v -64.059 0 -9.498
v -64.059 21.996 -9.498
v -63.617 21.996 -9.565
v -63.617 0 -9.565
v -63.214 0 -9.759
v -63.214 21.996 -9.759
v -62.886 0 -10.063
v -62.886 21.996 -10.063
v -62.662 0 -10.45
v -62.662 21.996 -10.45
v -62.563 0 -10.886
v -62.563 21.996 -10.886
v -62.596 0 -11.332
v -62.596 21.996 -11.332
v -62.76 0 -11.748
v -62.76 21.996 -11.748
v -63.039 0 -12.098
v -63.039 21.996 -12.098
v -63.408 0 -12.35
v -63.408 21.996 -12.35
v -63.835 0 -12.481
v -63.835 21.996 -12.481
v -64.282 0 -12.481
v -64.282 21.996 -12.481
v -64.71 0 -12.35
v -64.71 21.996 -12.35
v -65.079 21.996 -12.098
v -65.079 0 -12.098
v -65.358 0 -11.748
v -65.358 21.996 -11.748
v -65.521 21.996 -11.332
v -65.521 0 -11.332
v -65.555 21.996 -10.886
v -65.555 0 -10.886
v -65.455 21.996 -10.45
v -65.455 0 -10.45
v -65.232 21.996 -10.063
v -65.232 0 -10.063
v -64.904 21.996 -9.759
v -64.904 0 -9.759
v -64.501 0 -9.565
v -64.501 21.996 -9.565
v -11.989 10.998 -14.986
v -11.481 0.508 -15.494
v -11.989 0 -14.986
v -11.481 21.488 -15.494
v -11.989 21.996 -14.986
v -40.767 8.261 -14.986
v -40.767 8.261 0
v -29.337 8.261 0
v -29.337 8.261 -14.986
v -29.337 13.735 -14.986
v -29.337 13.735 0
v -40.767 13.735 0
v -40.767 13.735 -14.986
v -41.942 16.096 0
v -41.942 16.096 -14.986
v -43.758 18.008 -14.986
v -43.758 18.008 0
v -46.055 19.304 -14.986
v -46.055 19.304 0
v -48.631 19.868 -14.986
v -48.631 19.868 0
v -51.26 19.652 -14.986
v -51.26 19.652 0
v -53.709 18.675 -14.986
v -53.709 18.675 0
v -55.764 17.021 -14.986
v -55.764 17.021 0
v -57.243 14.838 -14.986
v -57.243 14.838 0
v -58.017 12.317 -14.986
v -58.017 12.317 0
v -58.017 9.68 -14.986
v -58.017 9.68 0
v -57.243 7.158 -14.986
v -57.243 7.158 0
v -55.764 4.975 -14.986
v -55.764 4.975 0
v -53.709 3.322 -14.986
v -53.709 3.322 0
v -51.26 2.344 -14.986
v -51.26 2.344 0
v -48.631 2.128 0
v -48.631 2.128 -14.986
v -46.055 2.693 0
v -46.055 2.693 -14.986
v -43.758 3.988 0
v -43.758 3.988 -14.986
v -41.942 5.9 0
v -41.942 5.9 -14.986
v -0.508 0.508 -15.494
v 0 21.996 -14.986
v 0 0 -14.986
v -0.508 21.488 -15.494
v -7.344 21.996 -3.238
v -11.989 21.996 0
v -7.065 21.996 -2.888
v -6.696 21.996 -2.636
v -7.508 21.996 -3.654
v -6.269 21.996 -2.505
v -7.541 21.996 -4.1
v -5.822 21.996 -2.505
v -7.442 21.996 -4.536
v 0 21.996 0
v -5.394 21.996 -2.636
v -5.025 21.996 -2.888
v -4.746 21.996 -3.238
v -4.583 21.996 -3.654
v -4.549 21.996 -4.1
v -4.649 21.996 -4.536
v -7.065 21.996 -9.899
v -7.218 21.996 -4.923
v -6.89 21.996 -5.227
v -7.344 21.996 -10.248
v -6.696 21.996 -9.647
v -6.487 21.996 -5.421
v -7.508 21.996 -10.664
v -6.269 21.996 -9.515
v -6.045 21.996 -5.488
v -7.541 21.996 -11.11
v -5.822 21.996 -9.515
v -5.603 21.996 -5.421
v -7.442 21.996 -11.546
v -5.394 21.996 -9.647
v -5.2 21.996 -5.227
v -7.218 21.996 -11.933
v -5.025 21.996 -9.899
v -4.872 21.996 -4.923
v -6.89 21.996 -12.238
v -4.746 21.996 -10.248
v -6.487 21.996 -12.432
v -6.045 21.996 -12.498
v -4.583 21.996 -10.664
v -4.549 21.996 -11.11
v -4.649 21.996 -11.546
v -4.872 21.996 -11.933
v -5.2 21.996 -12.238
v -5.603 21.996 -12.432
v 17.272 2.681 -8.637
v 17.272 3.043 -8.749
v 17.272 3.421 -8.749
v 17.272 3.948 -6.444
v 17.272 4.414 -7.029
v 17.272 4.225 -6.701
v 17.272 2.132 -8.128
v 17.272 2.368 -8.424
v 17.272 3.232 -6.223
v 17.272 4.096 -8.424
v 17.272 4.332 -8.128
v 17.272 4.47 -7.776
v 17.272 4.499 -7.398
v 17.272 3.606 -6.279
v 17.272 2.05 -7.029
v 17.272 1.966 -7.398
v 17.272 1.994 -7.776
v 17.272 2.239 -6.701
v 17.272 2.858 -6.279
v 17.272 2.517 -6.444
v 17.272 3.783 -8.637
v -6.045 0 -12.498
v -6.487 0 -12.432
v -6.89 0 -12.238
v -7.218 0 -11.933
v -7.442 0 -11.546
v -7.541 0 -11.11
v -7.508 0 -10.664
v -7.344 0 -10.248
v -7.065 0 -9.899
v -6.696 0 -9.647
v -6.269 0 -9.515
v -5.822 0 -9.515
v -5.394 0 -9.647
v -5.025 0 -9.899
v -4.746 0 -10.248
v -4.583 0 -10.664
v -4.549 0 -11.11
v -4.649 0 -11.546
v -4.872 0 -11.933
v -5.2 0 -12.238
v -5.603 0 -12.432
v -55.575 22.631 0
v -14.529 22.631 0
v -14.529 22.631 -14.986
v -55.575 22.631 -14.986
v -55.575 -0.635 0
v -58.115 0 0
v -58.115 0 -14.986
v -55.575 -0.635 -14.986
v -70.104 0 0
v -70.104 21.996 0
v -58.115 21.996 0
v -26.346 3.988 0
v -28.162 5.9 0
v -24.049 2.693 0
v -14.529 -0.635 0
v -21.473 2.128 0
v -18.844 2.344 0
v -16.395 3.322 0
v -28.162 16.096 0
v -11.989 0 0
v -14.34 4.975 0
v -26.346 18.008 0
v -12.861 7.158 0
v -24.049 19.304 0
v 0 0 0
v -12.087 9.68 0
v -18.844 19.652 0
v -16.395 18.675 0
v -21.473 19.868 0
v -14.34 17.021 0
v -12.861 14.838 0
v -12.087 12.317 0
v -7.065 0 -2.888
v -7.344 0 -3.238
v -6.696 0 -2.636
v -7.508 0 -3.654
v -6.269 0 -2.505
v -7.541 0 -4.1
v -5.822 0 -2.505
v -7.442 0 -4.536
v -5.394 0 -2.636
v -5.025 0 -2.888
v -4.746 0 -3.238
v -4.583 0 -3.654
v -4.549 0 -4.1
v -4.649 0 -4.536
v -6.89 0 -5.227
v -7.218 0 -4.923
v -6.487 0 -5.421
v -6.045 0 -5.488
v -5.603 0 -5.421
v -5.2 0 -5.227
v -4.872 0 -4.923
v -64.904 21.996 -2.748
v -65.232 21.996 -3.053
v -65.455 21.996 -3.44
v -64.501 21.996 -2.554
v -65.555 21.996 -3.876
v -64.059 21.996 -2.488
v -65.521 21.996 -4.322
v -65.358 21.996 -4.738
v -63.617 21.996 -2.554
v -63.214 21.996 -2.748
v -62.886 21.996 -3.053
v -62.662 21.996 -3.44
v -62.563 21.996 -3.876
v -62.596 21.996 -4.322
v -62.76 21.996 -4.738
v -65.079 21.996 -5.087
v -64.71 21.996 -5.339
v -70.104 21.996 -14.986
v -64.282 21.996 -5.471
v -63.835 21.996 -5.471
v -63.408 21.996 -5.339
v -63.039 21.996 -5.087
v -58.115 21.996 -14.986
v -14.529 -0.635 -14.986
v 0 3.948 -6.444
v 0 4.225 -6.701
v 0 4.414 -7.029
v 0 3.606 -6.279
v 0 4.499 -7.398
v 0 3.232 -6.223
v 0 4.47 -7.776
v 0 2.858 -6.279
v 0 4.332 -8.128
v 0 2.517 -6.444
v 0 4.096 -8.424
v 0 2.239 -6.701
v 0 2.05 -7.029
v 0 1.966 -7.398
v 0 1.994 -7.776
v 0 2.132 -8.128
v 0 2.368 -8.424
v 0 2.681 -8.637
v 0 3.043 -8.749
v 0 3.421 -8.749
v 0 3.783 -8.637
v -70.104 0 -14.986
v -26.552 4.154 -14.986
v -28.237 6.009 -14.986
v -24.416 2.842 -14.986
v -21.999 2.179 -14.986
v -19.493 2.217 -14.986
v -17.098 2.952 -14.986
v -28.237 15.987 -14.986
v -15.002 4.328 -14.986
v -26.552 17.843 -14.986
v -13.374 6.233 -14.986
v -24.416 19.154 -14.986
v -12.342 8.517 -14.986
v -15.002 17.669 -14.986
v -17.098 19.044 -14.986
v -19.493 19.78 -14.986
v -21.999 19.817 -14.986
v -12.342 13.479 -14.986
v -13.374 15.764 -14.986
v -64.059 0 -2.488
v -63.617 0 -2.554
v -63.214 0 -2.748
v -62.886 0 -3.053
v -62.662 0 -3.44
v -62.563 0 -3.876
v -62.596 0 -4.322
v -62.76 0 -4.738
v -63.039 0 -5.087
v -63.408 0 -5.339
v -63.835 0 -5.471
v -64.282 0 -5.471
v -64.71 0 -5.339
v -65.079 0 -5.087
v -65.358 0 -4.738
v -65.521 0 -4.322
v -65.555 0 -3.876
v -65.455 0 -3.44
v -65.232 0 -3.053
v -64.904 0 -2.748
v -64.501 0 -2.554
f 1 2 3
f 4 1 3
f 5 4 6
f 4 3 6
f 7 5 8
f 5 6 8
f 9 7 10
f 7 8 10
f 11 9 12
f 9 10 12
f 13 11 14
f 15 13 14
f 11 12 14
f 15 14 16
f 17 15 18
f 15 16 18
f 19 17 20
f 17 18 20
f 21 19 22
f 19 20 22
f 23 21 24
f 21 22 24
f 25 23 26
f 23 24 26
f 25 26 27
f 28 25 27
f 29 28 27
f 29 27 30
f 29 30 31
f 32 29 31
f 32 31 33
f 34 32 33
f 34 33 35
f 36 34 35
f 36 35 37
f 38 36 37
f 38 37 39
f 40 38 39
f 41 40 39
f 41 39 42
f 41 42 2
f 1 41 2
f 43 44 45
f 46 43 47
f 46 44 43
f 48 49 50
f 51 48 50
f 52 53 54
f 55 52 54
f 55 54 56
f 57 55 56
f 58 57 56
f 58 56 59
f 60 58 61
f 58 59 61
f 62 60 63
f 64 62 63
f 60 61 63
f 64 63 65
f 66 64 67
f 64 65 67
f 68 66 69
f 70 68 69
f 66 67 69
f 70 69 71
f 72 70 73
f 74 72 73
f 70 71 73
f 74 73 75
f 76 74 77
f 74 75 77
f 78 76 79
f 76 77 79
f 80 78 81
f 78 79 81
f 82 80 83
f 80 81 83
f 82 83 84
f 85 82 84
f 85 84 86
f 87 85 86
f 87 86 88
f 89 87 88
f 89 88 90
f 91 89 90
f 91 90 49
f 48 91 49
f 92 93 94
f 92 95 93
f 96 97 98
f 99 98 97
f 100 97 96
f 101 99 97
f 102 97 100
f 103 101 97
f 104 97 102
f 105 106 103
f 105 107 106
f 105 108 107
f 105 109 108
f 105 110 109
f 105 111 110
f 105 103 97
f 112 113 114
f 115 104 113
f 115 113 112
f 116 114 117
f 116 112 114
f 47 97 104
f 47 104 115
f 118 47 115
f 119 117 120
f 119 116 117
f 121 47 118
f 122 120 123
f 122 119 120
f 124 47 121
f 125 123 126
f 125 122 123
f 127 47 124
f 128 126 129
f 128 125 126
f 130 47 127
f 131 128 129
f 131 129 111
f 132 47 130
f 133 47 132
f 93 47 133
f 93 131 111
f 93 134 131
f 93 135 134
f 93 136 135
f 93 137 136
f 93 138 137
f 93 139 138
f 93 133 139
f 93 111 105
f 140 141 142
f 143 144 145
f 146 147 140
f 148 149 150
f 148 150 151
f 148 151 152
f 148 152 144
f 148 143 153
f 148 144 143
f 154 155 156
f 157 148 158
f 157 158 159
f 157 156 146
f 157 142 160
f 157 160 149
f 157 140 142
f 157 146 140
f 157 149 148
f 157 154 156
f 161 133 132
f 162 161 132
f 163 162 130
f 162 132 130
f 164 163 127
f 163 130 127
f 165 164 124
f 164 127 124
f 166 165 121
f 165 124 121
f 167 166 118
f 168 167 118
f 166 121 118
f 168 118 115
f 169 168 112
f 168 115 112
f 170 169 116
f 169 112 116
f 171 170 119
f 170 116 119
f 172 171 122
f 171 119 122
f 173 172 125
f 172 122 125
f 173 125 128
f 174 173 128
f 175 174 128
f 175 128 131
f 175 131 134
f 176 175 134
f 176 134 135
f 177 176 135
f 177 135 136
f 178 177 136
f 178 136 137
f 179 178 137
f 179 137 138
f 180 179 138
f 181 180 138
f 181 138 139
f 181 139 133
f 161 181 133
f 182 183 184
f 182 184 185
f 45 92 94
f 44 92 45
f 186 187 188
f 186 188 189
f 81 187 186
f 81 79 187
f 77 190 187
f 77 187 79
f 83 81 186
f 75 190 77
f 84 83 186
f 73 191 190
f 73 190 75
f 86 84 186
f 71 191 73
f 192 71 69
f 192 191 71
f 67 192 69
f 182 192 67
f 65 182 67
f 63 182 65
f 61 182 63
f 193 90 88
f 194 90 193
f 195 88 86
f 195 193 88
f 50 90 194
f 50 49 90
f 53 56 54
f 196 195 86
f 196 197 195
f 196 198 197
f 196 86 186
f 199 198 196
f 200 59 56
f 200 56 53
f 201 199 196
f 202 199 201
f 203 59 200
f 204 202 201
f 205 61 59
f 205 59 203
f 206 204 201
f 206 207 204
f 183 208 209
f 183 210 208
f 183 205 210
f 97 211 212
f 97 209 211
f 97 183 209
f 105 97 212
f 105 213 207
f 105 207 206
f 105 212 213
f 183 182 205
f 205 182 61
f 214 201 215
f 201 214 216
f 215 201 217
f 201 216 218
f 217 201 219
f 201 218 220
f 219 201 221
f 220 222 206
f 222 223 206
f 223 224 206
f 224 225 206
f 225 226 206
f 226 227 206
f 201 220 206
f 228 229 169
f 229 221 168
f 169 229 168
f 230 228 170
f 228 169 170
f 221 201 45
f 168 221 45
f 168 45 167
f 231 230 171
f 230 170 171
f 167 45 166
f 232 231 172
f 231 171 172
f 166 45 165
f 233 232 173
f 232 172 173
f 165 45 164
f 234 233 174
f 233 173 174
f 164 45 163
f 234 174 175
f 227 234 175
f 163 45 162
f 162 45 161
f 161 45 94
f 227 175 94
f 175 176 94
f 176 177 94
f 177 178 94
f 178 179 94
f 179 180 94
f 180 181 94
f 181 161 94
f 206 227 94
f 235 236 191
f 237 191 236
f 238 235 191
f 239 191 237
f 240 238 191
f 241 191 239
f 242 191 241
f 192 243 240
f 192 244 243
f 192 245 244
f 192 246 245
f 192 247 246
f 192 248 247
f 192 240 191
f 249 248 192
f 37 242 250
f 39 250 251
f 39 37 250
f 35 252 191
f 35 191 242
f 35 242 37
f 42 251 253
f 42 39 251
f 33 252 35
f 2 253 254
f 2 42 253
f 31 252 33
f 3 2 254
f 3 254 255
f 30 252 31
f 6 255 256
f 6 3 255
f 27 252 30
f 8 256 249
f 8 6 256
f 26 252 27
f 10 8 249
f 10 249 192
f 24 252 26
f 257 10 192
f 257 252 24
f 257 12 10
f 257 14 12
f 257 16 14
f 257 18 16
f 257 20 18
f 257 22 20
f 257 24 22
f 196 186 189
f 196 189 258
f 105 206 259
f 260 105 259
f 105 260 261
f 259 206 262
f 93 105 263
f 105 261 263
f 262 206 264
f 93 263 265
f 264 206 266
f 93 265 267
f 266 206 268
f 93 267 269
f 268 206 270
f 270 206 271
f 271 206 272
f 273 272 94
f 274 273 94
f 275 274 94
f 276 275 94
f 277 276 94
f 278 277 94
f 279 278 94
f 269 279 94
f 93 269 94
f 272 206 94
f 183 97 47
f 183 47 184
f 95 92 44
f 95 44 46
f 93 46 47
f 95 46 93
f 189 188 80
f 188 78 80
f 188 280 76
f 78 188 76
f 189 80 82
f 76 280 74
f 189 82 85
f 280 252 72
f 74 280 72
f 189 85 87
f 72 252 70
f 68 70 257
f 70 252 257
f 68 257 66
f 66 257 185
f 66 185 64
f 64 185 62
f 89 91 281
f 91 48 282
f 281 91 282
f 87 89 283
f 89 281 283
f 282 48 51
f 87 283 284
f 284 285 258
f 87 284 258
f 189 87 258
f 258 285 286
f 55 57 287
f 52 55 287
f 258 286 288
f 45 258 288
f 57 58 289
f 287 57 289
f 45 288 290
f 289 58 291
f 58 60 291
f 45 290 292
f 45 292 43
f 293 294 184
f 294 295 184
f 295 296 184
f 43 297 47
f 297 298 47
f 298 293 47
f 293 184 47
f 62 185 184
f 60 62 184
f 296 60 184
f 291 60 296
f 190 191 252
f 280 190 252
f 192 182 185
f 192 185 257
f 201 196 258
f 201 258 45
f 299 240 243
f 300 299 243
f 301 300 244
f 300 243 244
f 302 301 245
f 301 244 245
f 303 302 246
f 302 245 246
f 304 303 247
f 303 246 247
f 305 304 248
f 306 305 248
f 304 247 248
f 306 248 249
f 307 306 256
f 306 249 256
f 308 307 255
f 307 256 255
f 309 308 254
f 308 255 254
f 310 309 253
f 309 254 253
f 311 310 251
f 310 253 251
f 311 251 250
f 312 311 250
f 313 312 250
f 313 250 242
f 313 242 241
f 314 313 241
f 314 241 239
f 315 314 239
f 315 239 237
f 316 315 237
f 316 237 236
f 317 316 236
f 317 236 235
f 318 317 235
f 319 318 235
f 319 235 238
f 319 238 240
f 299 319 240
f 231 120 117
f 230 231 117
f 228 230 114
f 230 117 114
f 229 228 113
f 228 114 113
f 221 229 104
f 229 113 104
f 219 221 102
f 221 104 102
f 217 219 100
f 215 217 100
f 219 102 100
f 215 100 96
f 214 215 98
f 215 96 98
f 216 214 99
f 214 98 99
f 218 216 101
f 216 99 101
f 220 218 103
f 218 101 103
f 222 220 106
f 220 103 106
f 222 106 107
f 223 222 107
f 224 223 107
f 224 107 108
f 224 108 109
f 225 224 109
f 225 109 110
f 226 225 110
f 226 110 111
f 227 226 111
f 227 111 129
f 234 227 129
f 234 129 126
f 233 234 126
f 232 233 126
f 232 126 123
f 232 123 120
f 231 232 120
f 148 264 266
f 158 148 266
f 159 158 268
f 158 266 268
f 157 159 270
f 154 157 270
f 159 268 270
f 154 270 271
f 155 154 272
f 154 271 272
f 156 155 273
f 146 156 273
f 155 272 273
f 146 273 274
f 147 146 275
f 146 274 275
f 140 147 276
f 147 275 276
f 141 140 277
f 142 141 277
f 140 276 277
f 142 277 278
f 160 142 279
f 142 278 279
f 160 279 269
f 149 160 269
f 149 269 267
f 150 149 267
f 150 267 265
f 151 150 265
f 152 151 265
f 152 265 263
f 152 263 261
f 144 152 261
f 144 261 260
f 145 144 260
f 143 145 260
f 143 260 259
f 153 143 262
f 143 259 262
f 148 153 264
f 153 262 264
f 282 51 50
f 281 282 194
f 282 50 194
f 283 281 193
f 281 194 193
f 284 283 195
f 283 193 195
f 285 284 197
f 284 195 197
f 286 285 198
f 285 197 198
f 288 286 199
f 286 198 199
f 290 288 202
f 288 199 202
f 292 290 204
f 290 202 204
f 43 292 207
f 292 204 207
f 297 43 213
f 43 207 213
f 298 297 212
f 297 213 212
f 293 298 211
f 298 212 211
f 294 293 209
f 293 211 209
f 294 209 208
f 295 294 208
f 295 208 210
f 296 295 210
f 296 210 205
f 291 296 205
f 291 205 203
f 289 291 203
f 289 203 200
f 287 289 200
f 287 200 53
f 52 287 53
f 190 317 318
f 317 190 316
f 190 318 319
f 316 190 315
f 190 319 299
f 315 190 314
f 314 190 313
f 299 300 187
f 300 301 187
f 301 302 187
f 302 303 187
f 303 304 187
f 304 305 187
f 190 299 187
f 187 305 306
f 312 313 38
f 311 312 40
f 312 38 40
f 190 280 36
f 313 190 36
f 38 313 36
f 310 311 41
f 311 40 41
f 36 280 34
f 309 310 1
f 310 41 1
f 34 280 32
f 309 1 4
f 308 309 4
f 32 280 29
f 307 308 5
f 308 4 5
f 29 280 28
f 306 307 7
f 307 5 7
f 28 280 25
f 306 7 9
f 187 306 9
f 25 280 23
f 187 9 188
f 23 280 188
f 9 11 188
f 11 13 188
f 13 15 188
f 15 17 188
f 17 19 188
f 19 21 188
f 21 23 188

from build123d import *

# Parameters (mm, degrees)
SKETCH1_W           = 70.104
SKETCH1_H           = 14.986
BOSS_EXTRUDE1_DEPTH = 21.9964
CUT_EXTRUDE1_DEPTH  = 75.986616306
SKETCH4_R           = 1.5
CUT_EXTRUDE2_DEPTH  = 75.986616306
SKETCH5_R           = 1.27
BOSS_EXTRUDE2_DEPTH = 17.272
BOSS_EXTRUDE3_DEPTH = 14.986
SKETCH7_W           = 11.9888
SKETCH7_H           = 21.9964
BOSS_EXTRUDE4_DEPTH = 0.508
BOSS_EXTRUDE4_TAPER = 45


with BuildPart() as part:
    # Sketch1 → Boss-Extrude1 (new body)
    with BuildSketch(Plane(origin=(0, 0, 0), x_dir=(1, 0, 0), z_dir=(0, 1, 0))):
        with Locations((-35.052, 7.493)):
            Rectangle(SKETCH1_W, SKETCH1_H)
    extrude(amount=BOSS_EXTRUDE1_DEPTH)

    # Sketch3 → Cut-Extrude1 (cut, through all)
    with BuildSketch(Plane.XY):
        with BuildLine():
            Line((-29.337, 13.735160497), (-40.767, 13.735160497))
            ThreePointArc((-40.767, 13.735160497), (-58.1152, 10.9982), (-40.767, 8.261239503))
            Line((-40.767, 8.261239503), (-29.337, 8.261239503))
            ThreePointArc((-29.337, 8.261239503), (-11.9888, 10.9982), (-29.337, 13.735160497))
        make_face()
        Polygon((-58.1152, 21.9964), (-55.5752, 21.3614), (-14.5288, 21.3614), (-11.9888, 21.9964), align=None)
        Polygon((-58.1152, 0), (-55.5752, 0.635), (-14.5288, 0.635), (-11.9888, 0), align=None)
    extrude(amount=-CUT_EXTRUDE1_DEPTH, mode=Mode.SUBTRACT)

    # Sketch4 → Cut-Extrude2 (cut, through all)
    with BuildSketch(Plane(origin=(0, 21.9964, 0), x_dir=(1, 0, 0), z_dir=(0, 1, 0))):
        with Locations(Location((-64.0588, 10.9982, 0), (0, 0, 270))):
            Circle(SKETCH4_R)
        with Locations(Location((-64.0588, 3.9878, 0), (0, 0, 270))):
            Circle(SKETCH4_R)
        with Locations(Location((-6.0452, 3.9878, 0), (0, 0, 90))):
            Circle(SKETCH4_R)
        with Locations(Location((-6.0452, 10.9982, 0), (0, 0, 90))):
            Circle(SKETCH4_R)
    extrude(amount=-CUT_EXTRUDE2_DEPTH, mode=Mode.SUBTRACT)

    # Sketch5 → Boss-Extrude2 (add)
    with BuildSketch(Plane(origin=(0, 0, 0), x_dir=(0, 0, -1), z_dir=(1, 0, 0))):
        with Locations(Location((7.493, 3.23214606, 0), (0, 0, 180))):
            Circle(SKETCH5_R)
    extrude(amount=BOSS_EXTRUDE2_DEPTH)

    # Sketch6 → Boss-Extrude3 (add, through all)
    with BuildSketch(Plane.XY):
        Polygon((-58.1152, 21.9964), (-55.5752, 21.3614), (-14.5288, 21.3614), (-11.9888, 21.9964), (-14.5288, 22.6314), (-55.5752, 22.6314), align=None)
        Polygon((-55.5752, -0.635), (-14.5288, -0.635), (-11.9888, 0), (-14.5288, 0.635), (-55.5752, 0.635), (-58.1152, 0), align=None)
    extrude(amount=-BOSS_EXTRUDE3_DEPTH)

    # Sketch7 → Boss-Extrude4 (add)
    with BuildSketch(Plane(origin=(0, 0, -14.986), x_dir=(-1, 0, 0), z_dir=(0, 0, -1))):
        with Locations((5.9944, 10.9982)):
            Rectangle(SKETCH7_W, SKETCH7_H)
    extrude(amount=BOSS_EXTRUDE4_DEPTH, taper=BOSS_EXTRUDE4_TAPER)


solid = part.part
